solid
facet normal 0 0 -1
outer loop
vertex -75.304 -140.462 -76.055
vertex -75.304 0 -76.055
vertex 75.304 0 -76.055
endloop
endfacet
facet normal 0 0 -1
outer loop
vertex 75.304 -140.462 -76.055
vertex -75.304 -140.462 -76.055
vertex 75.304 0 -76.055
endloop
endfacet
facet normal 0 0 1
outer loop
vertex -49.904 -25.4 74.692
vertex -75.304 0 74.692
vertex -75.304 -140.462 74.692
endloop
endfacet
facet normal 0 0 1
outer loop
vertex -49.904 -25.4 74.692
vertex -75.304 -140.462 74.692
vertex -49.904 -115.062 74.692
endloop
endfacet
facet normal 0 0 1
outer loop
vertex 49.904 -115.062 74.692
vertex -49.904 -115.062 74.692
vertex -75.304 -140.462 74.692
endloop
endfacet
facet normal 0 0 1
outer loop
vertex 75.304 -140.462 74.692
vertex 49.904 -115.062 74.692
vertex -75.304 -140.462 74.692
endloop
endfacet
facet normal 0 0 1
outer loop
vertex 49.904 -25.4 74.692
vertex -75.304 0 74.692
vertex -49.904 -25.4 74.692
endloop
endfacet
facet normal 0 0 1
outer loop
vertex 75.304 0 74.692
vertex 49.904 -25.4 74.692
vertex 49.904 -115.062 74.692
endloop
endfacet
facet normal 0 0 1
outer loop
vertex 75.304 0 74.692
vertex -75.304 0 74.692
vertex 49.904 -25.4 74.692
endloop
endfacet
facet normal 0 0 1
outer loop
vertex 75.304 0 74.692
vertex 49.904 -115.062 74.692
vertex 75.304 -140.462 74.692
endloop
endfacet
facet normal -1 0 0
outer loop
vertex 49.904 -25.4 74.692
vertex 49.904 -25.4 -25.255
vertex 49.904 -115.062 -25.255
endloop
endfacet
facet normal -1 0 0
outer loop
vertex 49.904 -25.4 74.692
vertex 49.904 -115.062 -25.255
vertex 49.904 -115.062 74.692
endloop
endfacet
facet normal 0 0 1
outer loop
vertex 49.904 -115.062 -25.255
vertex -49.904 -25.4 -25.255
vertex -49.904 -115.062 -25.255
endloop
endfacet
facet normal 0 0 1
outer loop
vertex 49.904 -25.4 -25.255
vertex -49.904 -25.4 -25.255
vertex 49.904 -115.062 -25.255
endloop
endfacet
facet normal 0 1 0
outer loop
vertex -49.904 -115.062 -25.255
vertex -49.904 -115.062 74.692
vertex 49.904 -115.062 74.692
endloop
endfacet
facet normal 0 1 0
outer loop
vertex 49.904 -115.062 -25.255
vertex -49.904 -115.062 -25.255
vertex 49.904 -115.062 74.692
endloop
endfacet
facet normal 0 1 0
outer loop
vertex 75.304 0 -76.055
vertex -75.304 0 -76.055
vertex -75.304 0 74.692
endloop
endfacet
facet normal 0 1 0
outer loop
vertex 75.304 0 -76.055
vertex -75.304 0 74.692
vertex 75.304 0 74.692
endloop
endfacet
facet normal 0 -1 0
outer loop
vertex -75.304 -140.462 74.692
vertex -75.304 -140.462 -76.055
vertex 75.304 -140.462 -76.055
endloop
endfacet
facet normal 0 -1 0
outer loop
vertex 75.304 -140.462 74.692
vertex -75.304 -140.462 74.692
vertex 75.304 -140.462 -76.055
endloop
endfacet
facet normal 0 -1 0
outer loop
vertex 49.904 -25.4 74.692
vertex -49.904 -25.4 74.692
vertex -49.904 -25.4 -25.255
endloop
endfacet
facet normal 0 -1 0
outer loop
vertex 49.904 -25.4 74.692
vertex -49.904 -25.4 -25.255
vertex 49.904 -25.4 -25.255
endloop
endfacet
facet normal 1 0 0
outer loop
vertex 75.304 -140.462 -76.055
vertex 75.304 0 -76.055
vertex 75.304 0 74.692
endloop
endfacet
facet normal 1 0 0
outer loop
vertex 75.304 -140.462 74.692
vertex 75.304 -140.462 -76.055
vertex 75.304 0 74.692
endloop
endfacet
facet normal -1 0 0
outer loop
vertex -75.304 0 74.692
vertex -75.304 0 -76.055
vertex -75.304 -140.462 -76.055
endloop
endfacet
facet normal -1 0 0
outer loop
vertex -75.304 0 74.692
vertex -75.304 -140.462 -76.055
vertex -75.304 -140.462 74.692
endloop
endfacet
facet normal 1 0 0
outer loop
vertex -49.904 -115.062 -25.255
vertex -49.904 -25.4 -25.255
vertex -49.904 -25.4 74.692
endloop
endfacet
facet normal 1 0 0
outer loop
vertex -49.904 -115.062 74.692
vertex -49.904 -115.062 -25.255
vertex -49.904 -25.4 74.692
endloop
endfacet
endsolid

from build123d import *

# Parameters (mm, degrees)
F0_W     = 150.6082415581
F0_H     = 150.7464423776
F1_DEPTH = 140.462
F2_T     = -25.4
F3_DEPTH = 25.4


with BuildPart() as f1:
    # F0 (on Front) → F1 (new body)
    with BuildSketch(Plane.XZ):
        with Locations((0, -0.6814859807)):
            Rectangle(F0_W, F0_H)
    extrude(amount=F1_DEPTH)

    # F2
    f2_openings = [f1.faces().sort_by_distance(p)[0] for p in [
        (0, -70.231, 74.691735),
    ]]
    offset(amount=F2_T, openings=f2_openings)

    # F3 (add): a face of the model
    f3_faces = [f1.faces().sort_by_distance(p)[0] for p in [
        (0, -70.231, -50.6547071695),
    ]]
    extrude(f3_faces, amount=F3_DEPTH)


solid = f1.part
